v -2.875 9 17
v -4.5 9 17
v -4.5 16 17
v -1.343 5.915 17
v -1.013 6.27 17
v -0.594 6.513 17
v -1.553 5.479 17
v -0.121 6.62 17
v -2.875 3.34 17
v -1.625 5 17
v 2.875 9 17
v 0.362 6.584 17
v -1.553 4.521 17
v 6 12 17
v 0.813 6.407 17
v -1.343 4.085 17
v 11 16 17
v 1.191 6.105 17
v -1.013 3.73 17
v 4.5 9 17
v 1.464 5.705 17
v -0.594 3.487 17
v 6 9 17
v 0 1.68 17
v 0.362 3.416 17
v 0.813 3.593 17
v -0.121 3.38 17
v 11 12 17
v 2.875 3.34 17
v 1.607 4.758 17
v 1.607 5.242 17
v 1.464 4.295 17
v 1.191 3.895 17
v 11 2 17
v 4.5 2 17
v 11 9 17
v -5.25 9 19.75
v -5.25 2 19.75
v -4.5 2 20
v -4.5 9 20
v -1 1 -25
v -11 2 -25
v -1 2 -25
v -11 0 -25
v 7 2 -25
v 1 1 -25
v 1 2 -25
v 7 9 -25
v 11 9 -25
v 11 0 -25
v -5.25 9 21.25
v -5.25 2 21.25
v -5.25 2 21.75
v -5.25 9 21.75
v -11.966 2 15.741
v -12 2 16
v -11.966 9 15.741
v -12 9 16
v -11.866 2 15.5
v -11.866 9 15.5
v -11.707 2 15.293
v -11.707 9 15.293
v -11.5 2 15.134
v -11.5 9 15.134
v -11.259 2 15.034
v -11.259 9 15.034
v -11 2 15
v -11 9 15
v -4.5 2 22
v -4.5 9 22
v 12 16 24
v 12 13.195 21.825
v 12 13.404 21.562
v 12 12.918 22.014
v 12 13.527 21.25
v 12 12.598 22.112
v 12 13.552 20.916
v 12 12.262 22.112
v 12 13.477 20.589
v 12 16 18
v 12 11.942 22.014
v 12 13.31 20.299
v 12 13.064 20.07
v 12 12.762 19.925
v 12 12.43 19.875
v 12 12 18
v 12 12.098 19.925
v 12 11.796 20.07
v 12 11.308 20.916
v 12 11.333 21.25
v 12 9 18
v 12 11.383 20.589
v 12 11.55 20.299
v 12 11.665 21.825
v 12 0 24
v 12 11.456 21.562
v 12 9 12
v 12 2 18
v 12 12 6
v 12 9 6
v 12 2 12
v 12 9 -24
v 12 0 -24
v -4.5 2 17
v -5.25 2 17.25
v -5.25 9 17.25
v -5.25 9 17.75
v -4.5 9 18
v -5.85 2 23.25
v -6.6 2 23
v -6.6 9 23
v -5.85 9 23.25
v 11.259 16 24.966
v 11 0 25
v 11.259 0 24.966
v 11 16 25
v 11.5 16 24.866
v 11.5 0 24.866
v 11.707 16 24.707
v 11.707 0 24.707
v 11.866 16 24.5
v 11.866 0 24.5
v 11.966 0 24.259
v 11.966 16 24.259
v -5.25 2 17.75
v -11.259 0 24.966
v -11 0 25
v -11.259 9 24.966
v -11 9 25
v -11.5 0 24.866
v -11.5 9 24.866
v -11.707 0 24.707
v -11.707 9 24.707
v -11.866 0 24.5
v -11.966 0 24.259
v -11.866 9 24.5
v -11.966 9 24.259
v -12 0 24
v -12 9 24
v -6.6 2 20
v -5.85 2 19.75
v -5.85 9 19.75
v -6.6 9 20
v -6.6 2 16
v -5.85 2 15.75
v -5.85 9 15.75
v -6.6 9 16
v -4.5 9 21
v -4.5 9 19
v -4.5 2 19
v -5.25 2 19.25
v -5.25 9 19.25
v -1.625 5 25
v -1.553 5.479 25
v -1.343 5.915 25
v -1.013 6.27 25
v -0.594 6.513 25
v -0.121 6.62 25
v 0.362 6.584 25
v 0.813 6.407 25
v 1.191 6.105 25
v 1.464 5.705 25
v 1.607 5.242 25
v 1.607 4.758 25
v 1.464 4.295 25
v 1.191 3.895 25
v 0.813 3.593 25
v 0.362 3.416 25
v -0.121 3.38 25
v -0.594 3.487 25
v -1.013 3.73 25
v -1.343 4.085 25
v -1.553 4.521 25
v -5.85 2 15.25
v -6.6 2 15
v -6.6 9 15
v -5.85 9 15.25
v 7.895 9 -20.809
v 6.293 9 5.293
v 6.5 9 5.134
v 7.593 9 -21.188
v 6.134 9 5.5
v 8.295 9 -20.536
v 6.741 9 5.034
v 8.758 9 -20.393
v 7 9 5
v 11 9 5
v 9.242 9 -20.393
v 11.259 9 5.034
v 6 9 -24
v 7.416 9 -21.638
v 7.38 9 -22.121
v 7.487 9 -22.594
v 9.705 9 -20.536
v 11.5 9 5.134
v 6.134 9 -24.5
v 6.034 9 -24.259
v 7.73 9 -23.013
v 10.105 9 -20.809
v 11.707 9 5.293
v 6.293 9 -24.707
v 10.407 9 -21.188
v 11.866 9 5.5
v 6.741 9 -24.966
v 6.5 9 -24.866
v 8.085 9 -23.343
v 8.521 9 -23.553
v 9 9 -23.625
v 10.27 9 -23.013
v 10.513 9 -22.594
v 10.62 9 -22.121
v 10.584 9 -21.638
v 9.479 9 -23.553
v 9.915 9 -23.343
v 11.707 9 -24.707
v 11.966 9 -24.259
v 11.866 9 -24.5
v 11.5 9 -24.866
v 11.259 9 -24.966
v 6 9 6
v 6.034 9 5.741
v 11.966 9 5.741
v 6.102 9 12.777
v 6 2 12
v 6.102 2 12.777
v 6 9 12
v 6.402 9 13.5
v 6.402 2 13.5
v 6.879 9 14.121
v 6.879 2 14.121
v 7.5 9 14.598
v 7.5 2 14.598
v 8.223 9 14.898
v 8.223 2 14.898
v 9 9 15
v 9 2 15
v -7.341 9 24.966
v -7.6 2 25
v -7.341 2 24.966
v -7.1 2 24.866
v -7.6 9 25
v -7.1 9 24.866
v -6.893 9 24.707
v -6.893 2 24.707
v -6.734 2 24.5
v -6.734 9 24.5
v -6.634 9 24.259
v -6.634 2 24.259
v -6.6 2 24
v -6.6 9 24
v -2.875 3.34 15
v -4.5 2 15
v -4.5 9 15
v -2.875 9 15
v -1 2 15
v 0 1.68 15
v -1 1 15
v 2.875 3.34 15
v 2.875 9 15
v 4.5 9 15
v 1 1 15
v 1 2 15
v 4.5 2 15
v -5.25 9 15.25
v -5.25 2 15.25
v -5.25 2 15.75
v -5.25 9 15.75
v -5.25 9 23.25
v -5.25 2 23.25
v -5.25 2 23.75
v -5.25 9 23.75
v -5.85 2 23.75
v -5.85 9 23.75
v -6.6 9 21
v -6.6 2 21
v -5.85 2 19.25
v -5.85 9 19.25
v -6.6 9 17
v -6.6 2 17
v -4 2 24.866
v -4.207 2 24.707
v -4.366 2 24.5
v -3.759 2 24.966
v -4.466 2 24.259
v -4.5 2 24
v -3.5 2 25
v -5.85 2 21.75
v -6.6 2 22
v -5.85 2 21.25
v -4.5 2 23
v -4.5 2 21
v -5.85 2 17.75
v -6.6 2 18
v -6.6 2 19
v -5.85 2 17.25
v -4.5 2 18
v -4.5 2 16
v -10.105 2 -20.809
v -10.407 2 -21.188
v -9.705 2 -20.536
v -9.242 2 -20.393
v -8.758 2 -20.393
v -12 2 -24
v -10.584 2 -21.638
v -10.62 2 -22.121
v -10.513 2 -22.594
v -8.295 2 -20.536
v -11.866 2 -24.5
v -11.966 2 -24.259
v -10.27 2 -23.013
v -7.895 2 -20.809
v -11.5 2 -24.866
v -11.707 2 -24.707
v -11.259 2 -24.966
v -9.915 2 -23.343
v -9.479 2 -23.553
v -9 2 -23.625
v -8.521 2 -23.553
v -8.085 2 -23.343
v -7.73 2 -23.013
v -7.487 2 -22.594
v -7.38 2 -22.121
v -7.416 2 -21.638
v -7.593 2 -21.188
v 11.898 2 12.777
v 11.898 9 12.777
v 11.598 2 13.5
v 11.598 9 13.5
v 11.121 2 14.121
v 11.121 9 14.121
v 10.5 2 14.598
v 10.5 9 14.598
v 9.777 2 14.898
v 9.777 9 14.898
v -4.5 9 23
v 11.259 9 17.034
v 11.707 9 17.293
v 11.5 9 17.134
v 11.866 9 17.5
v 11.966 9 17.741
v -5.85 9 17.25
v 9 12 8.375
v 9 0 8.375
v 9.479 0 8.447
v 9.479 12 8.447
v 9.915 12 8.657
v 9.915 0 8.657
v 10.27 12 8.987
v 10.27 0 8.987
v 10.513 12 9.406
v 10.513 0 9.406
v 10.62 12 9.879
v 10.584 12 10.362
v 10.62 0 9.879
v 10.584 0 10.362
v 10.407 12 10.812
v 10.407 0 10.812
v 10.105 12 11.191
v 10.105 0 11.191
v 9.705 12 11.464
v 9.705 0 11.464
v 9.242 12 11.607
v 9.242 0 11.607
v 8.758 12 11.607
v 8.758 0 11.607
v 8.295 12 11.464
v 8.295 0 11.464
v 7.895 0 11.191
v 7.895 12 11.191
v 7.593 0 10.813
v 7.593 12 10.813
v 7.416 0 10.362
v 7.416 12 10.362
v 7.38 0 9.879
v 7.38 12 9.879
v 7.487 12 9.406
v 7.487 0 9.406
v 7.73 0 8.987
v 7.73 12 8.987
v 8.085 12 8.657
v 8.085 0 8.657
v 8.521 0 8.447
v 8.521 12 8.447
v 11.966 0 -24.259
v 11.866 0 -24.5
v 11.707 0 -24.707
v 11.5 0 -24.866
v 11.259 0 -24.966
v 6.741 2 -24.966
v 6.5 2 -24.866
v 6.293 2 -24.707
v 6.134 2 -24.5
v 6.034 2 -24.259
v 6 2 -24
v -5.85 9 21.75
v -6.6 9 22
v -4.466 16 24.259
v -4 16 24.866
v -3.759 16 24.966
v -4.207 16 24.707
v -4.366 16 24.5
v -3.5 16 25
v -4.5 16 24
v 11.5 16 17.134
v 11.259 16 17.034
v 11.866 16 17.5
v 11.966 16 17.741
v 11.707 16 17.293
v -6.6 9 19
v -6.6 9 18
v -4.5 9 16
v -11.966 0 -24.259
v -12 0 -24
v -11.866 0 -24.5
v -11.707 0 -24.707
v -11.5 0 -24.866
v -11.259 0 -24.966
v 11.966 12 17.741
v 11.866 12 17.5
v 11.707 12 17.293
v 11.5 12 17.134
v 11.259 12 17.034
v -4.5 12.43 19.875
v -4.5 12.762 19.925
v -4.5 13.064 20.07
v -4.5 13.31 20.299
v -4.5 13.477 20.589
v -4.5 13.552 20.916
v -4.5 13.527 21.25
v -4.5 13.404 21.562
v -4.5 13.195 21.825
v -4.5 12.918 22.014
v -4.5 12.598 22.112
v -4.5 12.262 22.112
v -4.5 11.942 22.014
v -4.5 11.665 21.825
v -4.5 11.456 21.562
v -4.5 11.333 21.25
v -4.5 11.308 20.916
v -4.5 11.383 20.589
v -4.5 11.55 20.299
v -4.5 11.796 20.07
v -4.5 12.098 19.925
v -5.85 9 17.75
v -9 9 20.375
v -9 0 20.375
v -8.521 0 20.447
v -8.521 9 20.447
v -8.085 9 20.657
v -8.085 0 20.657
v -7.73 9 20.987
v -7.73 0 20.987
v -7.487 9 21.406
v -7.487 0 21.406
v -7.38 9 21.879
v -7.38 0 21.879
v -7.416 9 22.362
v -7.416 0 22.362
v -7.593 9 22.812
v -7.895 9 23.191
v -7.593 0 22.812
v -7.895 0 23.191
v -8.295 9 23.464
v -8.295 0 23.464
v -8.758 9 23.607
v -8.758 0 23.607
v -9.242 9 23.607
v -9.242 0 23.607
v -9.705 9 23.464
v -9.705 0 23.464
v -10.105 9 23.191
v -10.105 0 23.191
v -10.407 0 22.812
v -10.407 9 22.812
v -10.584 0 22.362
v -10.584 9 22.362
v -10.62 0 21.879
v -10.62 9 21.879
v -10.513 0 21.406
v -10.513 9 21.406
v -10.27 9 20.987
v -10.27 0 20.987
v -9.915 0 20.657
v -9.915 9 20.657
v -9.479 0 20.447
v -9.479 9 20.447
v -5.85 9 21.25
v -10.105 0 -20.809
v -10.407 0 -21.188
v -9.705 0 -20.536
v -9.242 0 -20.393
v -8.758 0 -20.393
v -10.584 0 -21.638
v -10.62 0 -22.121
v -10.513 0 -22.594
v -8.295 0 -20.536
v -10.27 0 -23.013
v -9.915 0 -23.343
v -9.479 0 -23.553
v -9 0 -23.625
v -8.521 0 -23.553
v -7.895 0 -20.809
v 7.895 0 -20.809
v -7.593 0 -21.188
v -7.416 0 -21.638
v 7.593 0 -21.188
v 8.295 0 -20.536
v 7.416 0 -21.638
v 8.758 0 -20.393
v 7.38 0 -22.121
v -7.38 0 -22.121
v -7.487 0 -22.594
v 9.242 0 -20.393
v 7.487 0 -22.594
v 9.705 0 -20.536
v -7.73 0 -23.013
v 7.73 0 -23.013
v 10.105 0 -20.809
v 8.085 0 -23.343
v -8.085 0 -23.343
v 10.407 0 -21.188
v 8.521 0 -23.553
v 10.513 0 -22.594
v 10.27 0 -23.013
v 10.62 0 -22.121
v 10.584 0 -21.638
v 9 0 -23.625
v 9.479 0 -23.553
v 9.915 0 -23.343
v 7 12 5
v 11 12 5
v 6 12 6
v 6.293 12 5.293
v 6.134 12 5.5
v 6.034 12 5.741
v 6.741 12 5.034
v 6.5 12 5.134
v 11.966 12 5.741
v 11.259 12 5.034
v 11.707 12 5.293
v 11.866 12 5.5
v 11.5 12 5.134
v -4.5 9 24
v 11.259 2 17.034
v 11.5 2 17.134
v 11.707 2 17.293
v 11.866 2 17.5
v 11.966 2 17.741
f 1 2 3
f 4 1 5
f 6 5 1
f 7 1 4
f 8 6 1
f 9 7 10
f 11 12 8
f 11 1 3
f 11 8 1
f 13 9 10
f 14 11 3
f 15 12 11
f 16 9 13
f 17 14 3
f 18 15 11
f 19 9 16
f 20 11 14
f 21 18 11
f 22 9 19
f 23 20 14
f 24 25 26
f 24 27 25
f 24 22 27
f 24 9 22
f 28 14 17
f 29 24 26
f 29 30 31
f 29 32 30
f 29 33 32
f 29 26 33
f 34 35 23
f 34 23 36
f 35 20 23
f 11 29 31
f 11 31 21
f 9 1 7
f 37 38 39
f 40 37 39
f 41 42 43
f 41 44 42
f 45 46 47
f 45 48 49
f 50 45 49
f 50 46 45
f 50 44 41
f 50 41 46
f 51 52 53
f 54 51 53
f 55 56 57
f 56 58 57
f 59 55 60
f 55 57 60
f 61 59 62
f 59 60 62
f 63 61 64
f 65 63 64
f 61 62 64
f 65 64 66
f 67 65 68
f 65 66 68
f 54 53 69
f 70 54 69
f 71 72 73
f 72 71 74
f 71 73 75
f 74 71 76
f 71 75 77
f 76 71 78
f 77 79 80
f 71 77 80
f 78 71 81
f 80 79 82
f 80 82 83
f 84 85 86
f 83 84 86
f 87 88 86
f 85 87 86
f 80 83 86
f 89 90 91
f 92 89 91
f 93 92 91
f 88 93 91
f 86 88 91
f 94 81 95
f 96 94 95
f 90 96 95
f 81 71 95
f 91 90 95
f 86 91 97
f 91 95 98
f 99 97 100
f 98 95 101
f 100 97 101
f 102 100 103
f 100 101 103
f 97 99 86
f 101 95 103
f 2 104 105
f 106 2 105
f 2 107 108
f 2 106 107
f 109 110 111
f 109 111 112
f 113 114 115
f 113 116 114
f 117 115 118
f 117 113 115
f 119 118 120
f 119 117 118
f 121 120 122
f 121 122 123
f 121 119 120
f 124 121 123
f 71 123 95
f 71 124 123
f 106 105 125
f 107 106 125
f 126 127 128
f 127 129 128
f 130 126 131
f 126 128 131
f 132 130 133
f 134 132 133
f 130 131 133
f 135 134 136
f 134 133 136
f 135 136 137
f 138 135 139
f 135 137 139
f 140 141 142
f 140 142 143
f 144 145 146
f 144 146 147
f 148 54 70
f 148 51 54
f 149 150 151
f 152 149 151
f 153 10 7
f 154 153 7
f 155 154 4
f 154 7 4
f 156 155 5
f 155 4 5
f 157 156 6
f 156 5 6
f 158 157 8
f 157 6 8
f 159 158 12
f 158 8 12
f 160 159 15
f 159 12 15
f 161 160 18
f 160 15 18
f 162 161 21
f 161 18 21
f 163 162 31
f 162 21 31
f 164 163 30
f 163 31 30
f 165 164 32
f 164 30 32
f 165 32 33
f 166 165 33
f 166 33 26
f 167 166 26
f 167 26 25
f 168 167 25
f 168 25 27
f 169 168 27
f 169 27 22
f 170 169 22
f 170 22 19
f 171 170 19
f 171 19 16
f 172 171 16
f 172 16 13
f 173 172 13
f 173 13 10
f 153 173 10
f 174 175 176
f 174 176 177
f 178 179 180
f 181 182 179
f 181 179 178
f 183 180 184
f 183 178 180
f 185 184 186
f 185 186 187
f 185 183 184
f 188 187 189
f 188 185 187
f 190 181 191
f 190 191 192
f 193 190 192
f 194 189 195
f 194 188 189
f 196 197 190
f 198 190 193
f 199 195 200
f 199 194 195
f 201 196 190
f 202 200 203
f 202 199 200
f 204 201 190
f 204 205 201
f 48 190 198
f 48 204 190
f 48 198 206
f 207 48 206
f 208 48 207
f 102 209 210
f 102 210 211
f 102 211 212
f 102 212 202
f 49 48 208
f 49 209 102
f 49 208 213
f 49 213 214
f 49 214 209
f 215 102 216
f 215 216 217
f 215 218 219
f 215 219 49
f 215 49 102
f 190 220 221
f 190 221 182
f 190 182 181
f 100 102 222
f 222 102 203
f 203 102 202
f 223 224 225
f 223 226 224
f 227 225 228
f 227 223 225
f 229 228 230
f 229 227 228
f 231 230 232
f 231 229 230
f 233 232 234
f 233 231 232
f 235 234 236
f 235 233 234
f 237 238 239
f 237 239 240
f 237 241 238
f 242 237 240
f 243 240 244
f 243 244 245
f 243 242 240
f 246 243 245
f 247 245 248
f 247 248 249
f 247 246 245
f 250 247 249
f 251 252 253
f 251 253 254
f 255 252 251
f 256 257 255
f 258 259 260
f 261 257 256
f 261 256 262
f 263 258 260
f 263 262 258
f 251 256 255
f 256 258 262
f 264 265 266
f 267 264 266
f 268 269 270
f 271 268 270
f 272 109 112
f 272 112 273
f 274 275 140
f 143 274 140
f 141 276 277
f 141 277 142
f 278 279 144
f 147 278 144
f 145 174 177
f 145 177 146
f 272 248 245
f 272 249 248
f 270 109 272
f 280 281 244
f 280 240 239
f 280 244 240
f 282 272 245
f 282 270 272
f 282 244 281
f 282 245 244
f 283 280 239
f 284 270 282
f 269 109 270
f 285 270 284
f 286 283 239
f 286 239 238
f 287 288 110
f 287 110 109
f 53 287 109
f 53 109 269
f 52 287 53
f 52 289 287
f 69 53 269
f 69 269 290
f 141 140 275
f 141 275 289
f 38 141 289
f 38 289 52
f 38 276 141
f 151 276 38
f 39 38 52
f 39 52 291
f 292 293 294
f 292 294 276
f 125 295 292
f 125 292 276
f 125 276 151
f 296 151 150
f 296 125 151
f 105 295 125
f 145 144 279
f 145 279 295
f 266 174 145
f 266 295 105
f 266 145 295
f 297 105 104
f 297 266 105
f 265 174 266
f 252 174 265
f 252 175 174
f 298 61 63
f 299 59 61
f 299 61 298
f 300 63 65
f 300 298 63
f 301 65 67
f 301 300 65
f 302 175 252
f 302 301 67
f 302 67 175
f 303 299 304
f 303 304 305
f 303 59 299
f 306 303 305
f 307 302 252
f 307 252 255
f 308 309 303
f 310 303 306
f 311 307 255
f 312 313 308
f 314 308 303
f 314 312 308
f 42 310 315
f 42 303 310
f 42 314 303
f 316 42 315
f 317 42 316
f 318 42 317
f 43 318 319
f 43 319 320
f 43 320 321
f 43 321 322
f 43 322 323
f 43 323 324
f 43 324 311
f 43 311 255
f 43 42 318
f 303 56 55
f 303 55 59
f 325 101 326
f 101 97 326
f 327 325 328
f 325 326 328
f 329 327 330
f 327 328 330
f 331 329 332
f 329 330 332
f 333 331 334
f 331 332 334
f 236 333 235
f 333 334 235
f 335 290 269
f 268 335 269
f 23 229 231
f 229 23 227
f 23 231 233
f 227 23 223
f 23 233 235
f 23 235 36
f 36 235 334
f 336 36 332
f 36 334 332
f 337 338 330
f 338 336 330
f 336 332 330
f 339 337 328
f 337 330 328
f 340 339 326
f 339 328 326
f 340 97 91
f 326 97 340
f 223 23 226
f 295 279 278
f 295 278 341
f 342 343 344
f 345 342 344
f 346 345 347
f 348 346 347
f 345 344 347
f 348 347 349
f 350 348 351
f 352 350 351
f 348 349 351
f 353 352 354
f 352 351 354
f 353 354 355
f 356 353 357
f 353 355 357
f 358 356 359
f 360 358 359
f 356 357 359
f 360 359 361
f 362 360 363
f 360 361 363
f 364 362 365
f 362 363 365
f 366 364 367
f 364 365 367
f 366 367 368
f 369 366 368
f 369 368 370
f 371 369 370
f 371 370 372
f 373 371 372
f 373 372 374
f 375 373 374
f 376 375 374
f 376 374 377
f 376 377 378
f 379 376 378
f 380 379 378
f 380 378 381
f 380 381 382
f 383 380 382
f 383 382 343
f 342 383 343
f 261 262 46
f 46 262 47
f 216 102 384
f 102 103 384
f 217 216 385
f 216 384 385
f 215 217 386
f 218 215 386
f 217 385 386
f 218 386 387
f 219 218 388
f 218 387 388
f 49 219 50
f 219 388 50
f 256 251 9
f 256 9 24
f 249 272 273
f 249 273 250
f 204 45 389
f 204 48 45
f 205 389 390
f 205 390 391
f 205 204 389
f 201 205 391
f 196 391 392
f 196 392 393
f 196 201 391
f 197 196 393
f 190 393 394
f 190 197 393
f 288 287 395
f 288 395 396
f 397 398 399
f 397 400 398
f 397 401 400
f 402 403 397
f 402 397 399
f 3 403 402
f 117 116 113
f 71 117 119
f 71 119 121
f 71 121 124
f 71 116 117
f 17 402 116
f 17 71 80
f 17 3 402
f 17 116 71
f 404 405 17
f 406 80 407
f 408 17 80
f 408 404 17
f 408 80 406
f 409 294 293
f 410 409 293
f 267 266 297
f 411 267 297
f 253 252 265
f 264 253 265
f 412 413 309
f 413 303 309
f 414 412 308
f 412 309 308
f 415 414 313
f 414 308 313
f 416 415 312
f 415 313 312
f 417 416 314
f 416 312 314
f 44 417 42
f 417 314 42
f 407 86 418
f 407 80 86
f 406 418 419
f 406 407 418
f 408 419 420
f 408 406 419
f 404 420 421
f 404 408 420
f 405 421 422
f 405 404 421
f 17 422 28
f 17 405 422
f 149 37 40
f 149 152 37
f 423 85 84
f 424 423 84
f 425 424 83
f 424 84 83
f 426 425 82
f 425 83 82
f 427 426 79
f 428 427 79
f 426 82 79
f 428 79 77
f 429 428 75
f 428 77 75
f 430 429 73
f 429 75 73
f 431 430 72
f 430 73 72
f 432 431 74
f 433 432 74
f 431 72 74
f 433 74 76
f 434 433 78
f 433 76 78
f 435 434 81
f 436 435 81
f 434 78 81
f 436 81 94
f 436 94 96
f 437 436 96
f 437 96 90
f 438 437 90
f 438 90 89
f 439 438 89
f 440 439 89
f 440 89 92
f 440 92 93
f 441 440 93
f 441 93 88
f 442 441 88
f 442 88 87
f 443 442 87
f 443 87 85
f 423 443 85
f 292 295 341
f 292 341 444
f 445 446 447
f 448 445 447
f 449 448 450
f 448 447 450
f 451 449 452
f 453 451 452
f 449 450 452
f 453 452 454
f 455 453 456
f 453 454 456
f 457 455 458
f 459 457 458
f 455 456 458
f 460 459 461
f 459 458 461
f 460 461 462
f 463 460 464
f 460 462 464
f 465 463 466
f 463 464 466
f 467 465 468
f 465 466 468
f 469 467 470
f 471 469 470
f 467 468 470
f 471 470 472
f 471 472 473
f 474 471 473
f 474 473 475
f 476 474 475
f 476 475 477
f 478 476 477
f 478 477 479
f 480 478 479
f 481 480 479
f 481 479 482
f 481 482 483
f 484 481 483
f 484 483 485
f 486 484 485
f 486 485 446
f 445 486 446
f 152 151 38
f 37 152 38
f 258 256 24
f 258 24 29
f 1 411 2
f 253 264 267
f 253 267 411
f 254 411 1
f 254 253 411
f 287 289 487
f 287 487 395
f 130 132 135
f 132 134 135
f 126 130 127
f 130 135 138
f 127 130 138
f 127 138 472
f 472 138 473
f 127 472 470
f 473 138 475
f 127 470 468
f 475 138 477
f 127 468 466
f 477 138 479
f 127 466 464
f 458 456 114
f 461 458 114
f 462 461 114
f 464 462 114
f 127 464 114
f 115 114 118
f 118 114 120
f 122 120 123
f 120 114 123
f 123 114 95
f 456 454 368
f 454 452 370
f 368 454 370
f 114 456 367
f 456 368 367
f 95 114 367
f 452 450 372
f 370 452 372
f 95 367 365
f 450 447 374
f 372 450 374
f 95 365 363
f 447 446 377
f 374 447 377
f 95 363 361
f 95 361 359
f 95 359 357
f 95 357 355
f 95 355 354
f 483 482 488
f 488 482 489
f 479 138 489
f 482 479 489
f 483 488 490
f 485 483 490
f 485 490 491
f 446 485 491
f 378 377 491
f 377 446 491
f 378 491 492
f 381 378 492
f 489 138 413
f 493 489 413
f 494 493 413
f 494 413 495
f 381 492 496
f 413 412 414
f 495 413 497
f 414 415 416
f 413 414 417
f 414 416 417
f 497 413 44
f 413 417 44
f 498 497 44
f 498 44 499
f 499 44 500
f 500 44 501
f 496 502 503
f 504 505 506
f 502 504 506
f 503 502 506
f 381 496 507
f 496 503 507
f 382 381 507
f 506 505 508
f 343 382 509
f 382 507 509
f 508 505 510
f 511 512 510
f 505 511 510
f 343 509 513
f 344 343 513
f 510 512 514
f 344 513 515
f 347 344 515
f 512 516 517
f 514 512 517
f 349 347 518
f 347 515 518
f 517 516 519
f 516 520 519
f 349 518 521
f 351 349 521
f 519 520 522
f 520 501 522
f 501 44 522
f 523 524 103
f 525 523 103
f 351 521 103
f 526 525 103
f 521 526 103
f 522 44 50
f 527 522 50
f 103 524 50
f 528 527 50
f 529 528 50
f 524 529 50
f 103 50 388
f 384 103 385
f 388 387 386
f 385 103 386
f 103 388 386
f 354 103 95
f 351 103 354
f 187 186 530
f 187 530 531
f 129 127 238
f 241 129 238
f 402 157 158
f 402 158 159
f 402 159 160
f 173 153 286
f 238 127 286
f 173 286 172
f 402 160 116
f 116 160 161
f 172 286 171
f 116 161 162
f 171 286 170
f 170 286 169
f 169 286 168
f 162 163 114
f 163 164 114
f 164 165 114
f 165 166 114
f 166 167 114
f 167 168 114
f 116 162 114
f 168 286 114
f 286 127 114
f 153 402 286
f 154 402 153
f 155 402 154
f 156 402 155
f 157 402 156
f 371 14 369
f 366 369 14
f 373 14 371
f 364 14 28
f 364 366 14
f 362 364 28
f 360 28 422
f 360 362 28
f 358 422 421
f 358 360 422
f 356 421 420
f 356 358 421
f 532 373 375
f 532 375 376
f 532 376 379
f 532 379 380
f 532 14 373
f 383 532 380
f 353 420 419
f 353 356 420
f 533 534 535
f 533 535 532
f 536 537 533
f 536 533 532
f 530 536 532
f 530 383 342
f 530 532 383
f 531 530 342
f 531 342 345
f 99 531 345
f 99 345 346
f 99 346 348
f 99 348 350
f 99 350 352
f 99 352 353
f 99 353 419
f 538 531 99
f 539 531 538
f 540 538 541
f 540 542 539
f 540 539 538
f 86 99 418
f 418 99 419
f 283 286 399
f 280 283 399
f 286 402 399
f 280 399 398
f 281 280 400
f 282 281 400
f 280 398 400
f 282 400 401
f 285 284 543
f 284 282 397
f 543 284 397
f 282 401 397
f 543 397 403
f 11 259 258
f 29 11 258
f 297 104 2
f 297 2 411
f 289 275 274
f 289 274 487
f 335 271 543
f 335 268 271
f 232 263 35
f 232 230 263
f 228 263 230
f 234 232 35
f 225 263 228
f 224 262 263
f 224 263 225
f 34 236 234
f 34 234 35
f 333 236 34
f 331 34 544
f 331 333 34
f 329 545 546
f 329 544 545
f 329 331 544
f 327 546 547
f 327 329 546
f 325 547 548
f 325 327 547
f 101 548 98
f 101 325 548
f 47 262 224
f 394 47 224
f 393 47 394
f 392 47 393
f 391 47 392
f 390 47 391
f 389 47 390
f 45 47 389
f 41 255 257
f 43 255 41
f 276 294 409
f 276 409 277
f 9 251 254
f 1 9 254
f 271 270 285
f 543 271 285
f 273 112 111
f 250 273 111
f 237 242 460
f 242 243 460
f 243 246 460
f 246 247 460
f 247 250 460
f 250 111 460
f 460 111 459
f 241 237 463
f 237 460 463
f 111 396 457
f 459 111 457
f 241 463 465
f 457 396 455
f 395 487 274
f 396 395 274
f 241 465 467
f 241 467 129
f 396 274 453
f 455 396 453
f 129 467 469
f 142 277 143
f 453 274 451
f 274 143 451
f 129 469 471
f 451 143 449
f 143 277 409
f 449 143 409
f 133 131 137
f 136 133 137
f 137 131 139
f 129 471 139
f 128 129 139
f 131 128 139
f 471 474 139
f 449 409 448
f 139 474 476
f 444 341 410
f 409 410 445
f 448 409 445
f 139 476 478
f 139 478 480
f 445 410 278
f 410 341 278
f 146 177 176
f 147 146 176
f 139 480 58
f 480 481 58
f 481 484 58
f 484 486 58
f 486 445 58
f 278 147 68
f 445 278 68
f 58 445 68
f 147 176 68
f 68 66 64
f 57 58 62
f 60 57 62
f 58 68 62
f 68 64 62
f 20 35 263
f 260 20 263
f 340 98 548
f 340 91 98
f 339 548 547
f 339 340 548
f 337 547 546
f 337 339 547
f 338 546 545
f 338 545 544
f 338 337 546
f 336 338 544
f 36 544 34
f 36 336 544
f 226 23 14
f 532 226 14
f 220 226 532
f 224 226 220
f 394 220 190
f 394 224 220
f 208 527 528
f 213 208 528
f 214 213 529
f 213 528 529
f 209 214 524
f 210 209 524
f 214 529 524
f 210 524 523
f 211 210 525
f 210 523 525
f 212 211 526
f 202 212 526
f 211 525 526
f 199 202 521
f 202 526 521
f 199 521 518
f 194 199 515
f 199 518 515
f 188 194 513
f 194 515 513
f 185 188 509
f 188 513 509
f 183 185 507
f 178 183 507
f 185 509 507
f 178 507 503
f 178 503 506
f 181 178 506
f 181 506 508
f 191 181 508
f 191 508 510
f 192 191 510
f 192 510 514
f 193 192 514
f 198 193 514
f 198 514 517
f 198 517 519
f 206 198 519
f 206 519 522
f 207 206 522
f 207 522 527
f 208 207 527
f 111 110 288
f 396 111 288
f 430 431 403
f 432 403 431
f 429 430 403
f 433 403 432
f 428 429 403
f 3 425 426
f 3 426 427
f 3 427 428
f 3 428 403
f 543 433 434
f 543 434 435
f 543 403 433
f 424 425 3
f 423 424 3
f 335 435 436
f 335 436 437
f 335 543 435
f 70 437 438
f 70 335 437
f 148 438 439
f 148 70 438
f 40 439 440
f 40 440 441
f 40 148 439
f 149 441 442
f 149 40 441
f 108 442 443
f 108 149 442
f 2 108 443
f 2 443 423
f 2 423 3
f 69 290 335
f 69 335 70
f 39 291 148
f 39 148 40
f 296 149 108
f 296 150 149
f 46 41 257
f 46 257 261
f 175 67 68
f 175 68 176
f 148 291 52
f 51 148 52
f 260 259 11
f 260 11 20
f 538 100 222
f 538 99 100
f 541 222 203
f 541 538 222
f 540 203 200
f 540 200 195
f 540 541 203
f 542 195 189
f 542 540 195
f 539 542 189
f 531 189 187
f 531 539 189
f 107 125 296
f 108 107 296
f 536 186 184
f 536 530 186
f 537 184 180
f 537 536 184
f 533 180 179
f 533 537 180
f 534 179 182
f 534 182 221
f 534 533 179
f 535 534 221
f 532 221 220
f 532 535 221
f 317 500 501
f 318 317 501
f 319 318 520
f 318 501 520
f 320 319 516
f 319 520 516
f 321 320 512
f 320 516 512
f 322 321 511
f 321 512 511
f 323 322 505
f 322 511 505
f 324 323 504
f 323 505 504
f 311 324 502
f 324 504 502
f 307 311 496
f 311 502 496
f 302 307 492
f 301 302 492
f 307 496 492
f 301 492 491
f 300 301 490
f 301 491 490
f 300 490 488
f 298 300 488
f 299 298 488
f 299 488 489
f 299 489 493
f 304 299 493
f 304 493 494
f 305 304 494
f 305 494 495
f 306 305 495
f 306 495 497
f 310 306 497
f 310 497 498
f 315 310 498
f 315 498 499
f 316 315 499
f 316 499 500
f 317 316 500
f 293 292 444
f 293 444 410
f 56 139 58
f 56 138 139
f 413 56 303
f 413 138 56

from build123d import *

# Parameters (mm, degrees)
SKETCH1_W           = 24
SKETCH1_H           = 50
BOSS_EXTRUDE1_DEPTH = 2
SKETCH2_W           = 6
SKETCH2_H           = 40
SKETCH2_W_2         = 9
SKETCH2_H_2         = 10
SKETCH2_W_3         = 5.4
BOSS_EXTRUDE2_DEPTH = 7
FILLET1_R           = 3
SKETCH3_W           = 16.5
SKETCH3_H           = 8
BOSS_EXTRUDE3_DEPTH = 14
SKETCH4_R           = 1.625
CUT_EXTRUDE1_DEPTH  = 45.72135955
CUT_EXTRUDE2_DEPTH  = 2
SKETCH9_W           = 6
SKETCH9_H           = 20
BOSS_EXTRUDE4_DEPTH = 3
SKETCH6_R           = 1.125
CUT_EXTRUDE3_DEPTH  = 39.170669368
SKETCH7_W           = 2
SKETCH7_H           = 40
CUT_EXTRUDE4_DEPTH  = 1
SKETCH8_R           = 1.625
CUT_EXTRUDE5_DEPTH  = 33.015621187
FILLET2_R           = 1
BOSS_EXTRUDE5_DEPTH = 7
LPATTERN1_COUNT     = 5
LPATTERN1_PITCH     = 2


with BuildPart() as part:
    # Sketch1 → Boss-Extrude1 (new body)
    with BuildSketch(Plane(origin=(0, 0, 0), x_dir=(1, 0, 0), z_dir=(0, 1, 0))):
        Rectangle(SKETCH1_W, SKETCH1_H)
    extrude(amount=BOSS_EXTRUDE1_DEPTH)

    # Sketch2 → Boss-Extrude2 (add)
    with BuildSketch(Plane(origin=(0, 2, 0), x_dir=(1, 0, 0), z_dir=(0, 1, 0))):
        with Locations((9, 5)):
            Rectangle(SKETCH2_W, SKETCH2_H)
        with Locations((0, -20)):
            Rectangle(SKETCH2_W_2, SKETCH2_H_2)
        with Locations((-9.3, -20)):
            Rectangle(SKETCH2_W_3, SKETCH2_H_2)
    extrude(amount=BOSS_EXTRUDE2_DEPTH)

    # Fillet1
    fillet1_edges = [part.edges().sort_by_distance(p)[0] for p in [
        (12, 5.5, 15),
        (6, 5.5, 15),
    ]]
    fillet(fillet1_edges, radius=FILLET1_R - 0.0001)  # a hair under: the kernel refuses the full size

    # Sketch3 → Boss-Extrude3 (add)
    with BuildSketch(Plane(origin=(0, 2, 0), x_dir=(1, 0, 0), z_dir=(0, 1, 0))):
        with Locations((3.75, -21)):
            Rectangle(SKETCH3_W, SKETCH3_H)
    extrude(amount=BOSS_EXTRUDE3_DEPTH)

    # Sketch4 → Cut-Extrude1 (cut, through all)
    with BuildSketch(Plane(origin=(0, 0, 15), x_dir=(-1, 0, 0), z_dir=(0, 0, -1))):
        with Locations((0, 5)):
            Circle(SKETCH4_R)
    extrude(amount=-CUT_EXTRUDE1_DEPTH, mode=Mode.SUBTRACT)

    # Sketch5 → Cut-Extrude2 (cut)
    with BuildSketch(Plane(origin=(0, 0, 15), x_dir=(-1, 0, 0), z_dir=(0, 0, -1))):
        Polygon((-2.875, 6.659882024), (-2.875, 9), (2.875, 9), (2.875, 6.659882024), (2.875, 3.340117976), (0, 1.680235952), (-2.875, 3.340117976), align=None)
    extrude(amount=-CUT_EXTRUDE2_DEPTH, mode=Mode.SUBTRACT)

    # Sketch9 → Boss-Extrude4 (add)
    with BuildSketch(Plane(origin=(0, 9, 0), x_dir=(1, 0, 0), z_dir=(0, 1, 0))):
        with Locations((9, -15)):
            Rectangle(SKETCH9_W, SKETCH9_H)
    extrude(amount=BOSS_EXTRUDE4_DEPTH)

    # Sketch6 → Cut-Extrude3 (cut, through all)
    with BuildSketch(Plane(origin=(12, 0, 0), x_dir=(0, 0, -1), z_dir=(1, 0, 0))):
        with Locations((-21, 12.43)):
            Circle(SKETCH6_R)
    extrude(amount=-CUT_EXTRUDE3_DEPTH, mode=Mode.SUBTRACT)

    # Sketch7 → Cut-Extrude4 (cut)
    with BuildSketch(Plane(origin=(0, 2, 0), x_dir=(1, 0, 0), z_dir=(0, 1, 0))):
        with Locations((0, 5)):
            Rectangle(SKETCH7_W, SKETCH7_H)
    extrude(amount=-CUT_EXTRUDE4_DEPTH, mode=Mode.SUBTRACT)

    # Sketch8 → Cut-Extrude5 (cut, through all)
    with BuildSketch(Plane.XZ):
        with Locations(Location((-9, 22, 0), (0, 0, 270))):
            Circle(SKETCH8_R)
        with Locations(Location((9, 10, 0), (0, 0, 270))):
            Circle(SKETCH8_R)
        with Locations(Location((9, -22, 0), (0, 0, 270))):
            Circle(SKETCH8_R)
        with Locations(Location((-9, -22, 0), (0, 0, 270))):
            Circle(SKETCH8_R)
    extrude(amount=-CUT_EXTRUDE5_DEPTH, mode=Mode.SUBTRACT)

    # Fillet2
    fillet2_edges = [part.edges().sort_by_distance(p)[0] for p in [
        (12, 5.5, 17),
        (6, 10.5, 5),
        (12, 10.5, 5),
        (6, 5.5, -25),
        (-4.5, 9, 25),
        (-12, 5.5, 15),
        (-6.6, 5.5, 25),
        (12, 14, 17),
        (-12, 1, -25),
        (12, 4.5, -25),
        (12, 8, 25),
        (-12, 4.5, 25),
    ]]
    fillet(fillet2_edges, radius=FILLET2_R)

    # Sketch10 → Boss-Extrude5 (add)
    with BuildSketch(Plane(origin=(0, 2, 0), x_dir=(1, 0, 0), z_dir=(0, 1, 0))):
        Polygon((-6.6, -24), (-6.6, -23), (-5.85, -23.25), (-5.85, -23.75), align=None)
        Polygon((-5.25, -23.75), (-4.5, -24), (-4.5, -23), (-5.25, -23.25), align=None)
    boss_extrude5 = extrude(amount=BOSS_EXTRUDE5_DEPTH)

    # LPattern1: Boss-Extrude5 ×5
    with Locations(*[(0, 0, -i * LPATTERN1_PITCH) for i in range(1, LPATTERN1_COUNT)]):
        add(boss_extrude5)


solid = part.part
